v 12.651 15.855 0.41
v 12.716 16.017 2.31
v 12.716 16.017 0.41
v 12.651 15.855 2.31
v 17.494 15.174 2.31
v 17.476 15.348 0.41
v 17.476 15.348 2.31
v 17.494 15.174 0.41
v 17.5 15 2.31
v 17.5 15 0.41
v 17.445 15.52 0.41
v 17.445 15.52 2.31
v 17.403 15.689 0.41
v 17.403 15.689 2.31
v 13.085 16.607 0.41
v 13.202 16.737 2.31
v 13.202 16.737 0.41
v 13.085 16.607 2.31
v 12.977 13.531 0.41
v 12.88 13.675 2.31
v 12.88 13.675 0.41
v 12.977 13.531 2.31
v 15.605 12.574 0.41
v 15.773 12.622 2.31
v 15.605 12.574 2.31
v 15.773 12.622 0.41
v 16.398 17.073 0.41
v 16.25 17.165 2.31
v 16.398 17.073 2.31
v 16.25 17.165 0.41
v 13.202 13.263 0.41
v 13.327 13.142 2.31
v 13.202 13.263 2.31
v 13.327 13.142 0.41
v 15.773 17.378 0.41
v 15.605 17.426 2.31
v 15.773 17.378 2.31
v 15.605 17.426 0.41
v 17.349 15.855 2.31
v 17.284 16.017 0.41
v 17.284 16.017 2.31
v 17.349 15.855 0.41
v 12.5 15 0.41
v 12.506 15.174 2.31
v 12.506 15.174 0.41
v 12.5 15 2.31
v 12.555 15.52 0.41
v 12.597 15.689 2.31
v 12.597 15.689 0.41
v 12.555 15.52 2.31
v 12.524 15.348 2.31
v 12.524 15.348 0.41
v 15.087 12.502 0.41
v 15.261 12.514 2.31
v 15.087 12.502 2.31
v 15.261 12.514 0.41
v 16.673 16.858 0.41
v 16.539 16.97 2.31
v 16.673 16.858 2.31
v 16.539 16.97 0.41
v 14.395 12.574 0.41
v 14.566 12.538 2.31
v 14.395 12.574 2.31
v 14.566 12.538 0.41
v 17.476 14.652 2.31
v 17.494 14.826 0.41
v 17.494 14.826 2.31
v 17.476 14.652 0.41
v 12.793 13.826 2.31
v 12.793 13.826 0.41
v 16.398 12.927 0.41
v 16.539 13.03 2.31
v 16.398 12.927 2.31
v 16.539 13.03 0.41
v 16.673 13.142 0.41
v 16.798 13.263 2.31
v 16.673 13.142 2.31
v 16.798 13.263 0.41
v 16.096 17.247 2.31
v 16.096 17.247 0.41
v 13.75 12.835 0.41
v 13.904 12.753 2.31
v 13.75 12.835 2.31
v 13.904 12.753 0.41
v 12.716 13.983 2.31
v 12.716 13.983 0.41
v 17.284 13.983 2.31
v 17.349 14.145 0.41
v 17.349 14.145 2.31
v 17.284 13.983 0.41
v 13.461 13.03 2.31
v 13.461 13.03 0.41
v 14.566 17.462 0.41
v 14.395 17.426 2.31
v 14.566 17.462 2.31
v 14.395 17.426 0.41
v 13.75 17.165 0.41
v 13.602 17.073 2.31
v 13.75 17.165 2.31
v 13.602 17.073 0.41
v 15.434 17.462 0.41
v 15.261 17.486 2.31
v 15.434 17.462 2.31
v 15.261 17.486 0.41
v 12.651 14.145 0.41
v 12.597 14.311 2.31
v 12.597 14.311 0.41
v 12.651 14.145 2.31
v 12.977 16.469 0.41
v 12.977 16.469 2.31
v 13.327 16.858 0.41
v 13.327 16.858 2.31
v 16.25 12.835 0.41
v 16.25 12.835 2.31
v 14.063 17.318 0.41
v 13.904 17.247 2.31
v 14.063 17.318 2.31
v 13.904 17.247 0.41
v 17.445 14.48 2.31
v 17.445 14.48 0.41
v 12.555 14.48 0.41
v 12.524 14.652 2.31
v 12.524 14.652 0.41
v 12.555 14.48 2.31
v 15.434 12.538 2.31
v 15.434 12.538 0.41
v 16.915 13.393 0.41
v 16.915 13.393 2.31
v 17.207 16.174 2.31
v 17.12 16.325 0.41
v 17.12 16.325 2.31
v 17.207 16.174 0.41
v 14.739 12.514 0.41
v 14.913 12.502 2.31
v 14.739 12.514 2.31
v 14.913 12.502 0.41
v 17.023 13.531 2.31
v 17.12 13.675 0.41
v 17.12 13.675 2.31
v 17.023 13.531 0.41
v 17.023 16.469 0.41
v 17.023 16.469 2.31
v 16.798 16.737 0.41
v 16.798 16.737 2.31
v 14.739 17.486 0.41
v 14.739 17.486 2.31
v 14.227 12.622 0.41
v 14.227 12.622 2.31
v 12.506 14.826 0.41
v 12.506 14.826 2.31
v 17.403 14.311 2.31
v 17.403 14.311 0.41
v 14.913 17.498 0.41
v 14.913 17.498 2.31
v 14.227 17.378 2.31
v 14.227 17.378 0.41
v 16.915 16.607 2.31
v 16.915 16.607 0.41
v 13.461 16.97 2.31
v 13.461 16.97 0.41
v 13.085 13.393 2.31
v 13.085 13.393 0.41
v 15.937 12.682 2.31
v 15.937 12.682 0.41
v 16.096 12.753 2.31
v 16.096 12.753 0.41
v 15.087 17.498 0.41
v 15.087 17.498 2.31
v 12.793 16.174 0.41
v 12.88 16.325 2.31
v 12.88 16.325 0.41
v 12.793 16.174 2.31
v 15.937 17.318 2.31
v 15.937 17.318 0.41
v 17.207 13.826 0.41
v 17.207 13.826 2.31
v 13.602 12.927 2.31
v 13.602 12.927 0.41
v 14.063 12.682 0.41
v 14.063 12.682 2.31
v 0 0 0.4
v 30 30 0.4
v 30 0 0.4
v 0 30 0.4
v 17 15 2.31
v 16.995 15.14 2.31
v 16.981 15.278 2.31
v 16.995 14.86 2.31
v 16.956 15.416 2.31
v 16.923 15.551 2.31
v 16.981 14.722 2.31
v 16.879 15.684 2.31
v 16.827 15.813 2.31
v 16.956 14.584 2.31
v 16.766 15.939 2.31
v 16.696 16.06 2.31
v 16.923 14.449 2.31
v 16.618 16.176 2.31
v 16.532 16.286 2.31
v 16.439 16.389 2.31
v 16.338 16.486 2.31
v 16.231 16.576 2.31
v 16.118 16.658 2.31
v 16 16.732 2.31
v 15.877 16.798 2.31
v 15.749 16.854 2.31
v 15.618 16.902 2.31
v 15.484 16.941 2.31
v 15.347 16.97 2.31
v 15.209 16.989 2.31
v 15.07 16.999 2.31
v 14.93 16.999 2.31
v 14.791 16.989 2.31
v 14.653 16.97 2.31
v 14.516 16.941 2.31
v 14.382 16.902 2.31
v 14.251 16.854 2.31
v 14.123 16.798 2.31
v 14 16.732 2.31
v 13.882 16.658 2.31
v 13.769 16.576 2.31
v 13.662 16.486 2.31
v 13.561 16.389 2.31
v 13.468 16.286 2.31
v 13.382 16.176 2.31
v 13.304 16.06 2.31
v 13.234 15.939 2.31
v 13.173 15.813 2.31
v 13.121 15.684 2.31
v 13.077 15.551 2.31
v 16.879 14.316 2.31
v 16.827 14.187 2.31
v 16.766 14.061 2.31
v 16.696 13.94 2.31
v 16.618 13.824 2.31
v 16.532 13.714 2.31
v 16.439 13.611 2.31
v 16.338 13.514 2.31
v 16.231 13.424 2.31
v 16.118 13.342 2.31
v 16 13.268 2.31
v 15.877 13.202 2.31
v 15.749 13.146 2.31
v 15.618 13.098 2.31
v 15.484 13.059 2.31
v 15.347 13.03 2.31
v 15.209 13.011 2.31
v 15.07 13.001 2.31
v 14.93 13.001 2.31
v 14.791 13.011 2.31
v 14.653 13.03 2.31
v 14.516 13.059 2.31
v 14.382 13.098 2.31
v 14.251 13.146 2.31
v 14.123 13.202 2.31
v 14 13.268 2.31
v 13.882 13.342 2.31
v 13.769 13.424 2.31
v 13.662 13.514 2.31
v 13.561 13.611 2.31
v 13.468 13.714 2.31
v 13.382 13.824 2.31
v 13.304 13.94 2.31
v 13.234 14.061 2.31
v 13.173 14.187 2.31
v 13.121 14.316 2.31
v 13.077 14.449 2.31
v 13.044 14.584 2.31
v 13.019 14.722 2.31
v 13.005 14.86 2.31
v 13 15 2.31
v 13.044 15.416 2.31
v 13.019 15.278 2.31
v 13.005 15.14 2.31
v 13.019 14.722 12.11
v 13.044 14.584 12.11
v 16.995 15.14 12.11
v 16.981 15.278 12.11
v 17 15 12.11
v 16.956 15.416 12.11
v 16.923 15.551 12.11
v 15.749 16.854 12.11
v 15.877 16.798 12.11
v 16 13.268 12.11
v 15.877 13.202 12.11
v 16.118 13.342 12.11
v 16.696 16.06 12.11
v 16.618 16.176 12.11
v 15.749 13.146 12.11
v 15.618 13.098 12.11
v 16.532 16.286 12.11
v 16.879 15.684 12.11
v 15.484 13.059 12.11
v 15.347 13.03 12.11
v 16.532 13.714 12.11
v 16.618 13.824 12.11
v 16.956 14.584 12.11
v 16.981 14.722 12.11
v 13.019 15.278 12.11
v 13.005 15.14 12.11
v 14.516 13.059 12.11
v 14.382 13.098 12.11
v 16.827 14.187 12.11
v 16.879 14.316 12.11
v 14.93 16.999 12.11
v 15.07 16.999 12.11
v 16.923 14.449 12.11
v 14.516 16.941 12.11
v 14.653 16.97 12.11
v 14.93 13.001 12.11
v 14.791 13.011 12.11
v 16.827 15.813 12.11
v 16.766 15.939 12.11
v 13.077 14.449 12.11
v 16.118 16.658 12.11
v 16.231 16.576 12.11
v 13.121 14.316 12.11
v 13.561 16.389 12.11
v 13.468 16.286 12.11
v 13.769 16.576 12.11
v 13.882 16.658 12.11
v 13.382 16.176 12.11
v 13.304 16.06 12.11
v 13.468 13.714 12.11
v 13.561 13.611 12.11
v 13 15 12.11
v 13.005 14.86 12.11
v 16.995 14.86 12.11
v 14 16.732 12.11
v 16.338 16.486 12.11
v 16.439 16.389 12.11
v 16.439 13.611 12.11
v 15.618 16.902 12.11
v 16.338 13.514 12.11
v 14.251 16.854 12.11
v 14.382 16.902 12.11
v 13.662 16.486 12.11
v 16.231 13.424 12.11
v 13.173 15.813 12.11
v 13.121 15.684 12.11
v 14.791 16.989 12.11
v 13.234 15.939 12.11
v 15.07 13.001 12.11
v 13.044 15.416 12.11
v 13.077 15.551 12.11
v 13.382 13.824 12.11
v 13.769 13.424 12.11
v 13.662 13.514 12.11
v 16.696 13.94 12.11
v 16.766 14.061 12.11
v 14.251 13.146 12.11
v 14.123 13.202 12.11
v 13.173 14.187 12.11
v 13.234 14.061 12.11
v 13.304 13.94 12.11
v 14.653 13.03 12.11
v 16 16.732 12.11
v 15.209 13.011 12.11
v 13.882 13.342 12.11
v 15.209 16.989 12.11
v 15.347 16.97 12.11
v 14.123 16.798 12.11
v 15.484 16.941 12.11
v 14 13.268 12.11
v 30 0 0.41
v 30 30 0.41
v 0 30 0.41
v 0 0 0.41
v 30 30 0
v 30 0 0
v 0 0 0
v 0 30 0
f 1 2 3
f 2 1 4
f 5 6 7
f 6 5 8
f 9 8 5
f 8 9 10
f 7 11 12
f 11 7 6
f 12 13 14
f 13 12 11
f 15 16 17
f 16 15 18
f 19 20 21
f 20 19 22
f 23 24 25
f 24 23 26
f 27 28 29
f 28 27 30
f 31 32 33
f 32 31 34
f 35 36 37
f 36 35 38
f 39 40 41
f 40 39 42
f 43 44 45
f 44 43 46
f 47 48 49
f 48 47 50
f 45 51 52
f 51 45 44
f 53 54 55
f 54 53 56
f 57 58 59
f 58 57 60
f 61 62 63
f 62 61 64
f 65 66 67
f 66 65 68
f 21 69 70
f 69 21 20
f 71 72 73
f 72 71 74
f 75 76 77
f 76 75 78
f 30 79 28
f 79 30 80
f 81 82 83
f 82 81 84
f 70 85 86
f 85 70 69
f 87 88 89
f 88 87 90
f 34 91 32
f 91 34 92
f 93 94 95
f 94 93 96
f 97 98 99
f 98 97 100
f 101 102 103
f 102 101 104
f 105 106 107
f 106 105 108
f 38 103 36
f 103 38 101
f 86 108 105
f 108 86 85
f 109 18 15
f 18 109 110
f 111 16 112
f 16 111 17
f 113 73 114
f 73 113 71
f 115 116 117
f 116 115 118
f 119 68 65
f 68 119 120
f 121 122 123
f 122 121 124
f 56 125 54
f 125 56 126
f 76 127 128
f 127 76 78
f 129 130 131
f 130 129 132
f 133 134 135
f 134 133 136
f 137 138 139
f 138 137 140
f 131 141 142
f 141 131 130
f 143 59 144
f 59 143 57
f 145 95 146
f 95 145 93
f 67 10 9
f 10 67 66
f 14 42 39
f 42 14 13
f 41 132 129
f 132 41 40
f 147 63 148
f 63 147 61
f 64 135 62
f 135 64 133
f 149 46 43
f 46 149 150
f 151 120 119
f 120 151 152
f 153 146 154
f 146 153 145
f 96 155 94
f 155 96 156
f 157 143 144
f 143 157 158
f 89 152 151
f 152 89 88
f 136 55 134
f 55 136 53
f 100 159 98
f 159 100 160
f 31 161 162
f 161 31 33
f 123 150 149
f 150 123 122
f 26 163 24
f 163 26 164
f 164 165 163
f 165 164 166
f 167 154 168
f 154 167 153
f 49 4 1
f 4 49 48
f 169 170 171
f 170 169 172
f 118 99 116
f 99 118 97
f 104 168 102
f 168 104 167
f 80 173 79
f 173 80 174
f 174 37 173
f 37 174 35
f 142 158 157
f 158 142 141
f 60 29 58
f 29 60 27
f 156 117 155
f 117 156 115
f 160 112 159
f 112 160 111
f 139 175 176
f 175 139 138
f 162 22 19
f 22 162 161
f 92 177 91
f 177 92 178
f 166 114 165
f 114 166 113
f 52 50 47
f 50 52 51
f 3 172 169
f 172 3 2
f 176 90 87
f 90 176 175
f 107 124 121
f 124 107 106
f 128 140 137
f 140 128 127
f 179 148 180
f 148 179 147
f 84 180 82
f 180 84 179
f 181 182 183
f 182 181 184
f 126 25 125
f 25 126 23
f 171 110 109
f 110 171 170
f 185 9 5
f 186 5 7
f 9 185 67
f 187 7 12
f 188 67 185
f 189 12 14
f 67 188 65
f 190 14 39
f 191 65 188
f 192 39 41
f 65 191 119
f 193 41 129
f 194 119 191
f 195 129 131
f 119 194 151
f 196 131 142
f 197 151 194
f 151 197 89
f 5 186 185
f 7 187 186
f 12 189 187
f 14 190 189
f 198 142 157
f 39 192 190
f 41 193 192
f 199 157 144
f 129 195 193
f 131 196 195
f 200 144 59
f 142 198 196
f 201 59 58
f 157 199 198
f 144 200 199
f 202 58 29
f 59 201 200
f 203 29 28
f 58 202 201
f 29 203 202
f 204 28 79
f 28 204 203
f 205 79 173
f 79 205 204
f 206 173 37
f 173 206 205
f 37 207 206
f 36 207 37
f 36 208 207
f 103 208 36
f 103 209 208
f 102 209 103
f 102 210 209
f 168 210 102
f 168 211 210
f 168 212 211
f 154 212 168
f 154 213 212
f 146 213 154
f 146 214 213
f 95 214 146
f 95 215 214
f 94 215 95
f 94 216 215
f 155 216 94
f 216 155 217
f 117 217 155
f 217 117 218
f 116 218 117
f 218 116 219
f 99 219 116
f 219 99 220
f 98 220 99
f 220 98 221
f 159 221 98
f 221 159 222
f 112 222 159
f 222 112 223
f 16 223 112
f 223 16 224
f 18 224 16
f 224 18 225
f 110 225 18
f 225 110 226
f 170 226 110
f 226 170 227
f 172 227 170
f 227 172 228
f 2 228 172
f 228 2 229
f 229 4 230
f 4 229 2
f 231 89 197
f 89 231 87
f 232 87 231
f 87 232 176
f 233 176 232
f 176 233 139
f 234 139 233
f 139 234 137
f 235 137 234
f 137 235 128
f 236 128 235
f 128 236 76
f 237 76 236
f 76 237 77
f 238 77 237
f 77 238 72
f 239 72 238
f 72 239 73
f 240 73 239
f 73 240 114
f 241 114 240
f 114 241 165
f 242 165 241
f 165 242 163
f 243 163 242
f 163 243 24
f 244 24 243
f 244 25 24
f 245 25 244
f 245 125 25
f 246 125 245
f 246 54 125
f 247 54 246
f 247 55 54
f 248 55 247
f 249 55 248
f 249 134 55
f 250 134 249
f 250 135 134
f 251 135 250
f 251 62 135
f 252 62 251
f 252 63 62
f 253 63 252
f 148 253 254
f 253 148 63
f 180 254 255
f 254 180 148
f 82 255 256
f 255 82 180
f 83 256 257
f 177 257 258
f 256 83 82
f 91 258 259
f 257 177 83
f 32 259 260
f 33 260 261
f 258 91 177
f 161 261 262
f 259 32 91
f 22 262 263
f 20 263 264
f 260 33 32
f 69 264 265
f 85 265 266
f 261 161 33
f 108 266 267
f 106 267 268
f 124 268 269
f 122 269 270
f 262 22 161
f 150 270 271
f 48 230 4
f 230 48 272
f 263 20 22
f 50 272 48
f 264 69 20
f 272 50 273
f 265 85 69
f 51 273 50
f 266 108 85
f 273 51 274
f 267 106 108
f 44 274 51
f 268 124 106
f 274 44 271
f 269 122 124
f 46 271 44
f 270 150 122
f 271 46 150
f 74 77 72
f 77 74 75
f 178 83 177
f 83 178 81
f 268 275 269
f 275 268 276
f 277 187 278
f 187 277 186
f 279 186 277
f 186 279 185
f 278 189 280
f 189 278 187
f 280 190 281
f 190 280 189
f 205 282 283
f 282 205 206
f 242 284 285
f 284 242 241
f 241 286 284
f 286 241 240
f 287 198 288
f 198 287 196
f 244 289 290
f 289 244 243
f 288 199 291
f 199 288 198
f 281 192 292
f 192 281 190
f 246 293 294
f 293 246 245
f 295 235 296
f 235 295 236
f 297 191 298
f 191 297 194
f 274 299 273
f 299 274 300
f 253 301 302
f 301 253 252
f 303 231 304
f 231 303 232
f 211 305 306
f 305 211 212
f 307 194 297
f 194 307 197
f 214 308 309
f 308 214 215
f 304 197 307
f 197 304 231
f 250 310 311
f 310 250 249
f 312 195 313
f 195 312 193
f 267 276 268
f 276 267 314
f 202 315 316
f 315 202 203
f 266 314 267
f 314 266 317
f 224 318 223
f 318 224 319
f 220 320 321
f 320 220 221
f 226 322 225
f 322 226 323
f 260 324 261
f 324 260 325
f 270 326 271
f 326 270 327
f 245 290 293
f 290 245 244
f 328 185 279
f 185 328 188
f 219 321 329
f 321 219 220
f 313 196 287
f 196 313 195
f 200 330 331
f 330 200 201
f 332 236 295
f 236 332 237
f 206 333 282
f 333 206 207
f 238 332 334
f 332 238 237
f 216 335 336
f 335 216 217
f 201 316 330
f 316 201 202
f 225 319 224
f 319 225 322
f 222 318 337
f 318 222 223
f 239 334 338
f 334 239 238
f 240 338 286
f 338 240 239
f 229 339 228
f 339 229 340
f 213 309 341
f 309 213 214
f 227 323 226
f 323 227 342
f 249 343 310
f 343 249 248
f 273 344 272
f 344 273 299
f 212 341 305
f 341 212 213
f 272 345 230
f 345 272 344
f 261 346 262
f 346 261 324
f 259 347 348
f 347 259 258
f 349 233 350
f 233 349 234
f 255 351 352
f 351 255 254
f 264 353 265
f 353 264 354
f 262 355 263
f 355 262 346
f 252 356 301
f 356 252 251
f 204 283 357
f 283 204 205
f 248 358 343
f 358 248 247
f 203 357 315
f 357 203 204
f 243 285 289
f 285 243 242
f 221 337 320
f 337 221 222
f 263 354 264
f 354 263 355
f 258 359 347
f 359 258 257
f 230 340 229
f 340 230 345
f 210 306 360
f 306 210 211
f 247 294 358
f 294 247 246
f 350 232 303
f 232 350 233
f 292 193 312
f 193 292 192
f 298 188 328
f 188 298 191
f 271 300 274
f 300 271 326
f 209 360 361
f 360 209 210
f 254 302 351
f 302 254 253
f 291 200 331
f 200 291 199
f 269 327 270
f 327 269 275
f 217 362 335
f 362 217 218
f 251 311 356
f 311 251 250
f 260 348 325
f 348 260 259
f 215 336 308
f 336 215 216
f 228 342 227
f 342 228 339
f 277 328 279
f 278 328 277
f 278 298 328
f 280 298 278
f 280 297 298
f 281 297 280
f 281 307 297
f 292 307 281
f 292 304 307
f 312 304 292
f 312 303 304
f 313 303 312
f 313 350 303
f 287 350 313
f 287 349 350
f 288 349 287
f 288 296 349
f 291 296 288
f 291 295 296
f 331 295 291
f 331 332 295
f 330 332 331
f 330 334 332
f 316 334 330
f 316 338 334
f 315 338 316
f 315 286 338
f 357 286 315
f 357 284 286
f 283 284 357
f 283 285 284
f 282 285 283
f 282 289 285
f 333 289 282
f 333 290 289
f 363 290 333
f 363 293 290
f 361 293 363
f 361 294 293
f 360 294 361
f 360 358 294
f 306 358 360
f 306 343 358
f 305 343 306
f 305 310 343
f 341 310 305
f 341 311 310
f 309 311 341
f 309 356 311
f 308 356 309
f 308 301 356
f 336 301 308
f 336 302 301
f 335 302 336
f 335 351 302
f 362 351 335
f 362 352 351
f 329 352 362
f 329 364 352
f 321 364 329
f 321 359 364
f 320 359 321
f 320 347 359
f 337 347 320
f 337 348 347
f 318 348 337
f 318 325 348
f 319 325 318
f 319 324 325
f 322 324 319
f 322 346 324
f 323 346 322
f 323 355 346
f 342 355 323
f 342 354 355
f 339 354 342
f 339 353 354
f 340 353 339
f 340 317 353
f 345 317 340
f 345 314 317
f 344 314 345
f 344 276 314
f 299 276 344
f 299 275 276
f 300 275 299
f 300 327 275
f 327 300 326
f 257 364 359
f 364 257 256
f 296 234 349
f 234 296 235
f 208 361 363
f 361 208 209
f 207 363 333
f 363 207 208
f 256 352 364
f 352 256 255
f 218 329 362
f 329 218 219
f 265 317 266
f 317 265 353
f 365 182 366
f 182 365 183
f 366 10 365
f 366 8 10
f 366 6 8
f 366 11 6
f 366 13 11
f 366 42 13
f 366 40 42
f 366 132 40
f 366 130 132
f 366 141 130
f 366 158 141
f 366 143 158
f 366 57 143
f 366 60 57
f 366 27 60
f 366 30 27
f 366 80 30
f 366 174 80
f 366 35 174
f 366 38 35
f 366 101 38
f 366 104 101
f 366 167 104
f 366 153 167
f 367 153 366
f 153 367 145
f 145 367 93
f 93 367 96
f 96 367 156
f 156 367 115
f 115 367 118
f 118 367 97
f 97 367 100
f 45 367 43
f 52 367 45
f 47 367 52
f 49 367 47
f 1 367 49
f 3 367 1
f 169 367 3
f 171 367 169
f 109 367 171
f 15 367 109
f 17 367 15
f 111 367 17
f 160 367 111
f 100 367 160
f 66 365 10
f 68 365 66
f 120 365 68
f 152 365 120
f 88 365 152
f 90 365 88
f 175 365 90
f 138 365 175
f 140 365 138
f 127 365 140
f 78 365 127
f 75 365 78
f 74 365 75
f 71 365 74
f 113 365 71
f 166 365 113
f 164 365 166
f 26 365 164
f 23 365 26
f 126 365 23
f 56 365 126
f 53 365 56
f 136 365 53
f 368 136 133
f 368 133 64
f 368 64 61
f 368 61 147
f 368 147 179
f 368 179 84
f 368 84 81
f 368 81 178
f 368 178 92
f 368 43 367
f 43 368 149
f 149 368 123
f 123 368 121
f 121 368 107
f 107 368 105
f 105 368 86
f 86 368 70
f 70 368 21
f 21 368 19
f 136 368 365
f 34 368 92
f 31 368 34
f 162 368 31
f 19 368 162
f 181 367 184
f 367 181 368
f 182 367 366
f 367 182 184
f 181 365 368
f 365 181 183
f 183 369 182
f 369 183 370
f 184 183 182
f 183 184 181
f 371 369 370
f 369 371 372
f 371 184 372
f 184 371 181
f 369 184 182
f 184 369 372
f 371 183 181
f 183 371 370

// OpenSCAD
// file: ../../Base/Boxes.scad
// Fischertechnik Box Foundation
// Pre-designed Boxes

use <Constants.scad>

include <PlacementOptions.scad>

box190Width = 190;
box190Depth = 130;
box130Width = 130;
box130Depth = 95;
boxUsageHeight = 33.9;
boxWallThickness = 2.4;
boxBaseThickness = 1.0;
boxWebWidth = 3.0;

// getBoxWallThickness()
// Gets the wall thickness of a Fischertechnik Box

function getBoxWallThickness() = boxWallThickness;

// Gets the usable height of a fischertechnik box
function getBoxUsageHeight() = boxUsageHeight;

// Gets the thickness of the Fischertechnik box base.
function getBoxBaseThickness() = boxBaseThickness;

// Gets the width of a box web
function getBoxWebWidth() = boxWebWidth;

// Gets the usable inner space of a Box 190 as an x/y-list
function getBox190Space() = [
    box190Width - 2*getBoxWallThickness(), 
    box190Depth - 2*getBoxWallThickness() ];

// Imports the Fischertechnik empty box 130x190 mm and places it at position 0,0
// 190x130 are the outer sizes, the inner space is slightly smaller. Use getBox190Space() to get the inner sizes.
// This module needs the STL file "Fischertechnik Box 130x190.stl" in the library path.
// The box is positioned that the usable inner space is at the 0,0,0 position. The

module Box190() {
    translate([-getBoxWallThickness(),-getBoxWallThickness(),-getBoxBaseThickness()])
        import("Fischertechnik Box 130x190.stl", convexity=3);
}

// Gets the usable inner space of a Box 130 as an x/y-list
function getBox130Space() = [
    box130Width - 2*getBoxWallThickness(), 
    box130Depth - 2*getBoxWallThickness() ];

// Imports the Fischertechnik empty box 95x130 mm and places it at position 0,0
// 190x130 are the outer sizes, the inner space is slightly smaller. Use getBox190Space() to get the inner sizes.
// This module needs the STL file "Fischertechnik Box 95x130.stl" in the library path.
// The box is positioned that the usable inner space is at the 0,0,0 position. The

module Box130() {
    translate([-getBoxWallThickness(),-getBoxWallThickness(),-getBoxBaseThickness()])
        import("Fischertechnik Box 95x130.stl", convexity=3);
}

// Creates a web at the specified box walls
// corner 0 = LowerLeft, 1 = UpperLeft, 2 = UpperRight, 3 = LowerRight
// side 0 = LeftOfCorner, 1 = RightOfCorner
// distance = Distance in mm from the corner
// box = inner width and depth of the box (default: Box 190)
// webWidth = length of the web (default is 3 mms)
// webThickness = thickness of the web (default is 1 mm)

module BoxWeb(corner, side, distance, box=getBox190Space(), webWidth=getBoxWebWidth(), webThickness=1.0) {
    sink = getBoxWallThickness()/2;

    width = (corner % 2 == 0) ? 
            (side == LeftOfCorner ? webWidth : webThickness) :
            (side == LeftOfCorner ? webThickness : webWidth);

    depth = (corner % 2 == 0) ? 
            (side == RightOfCorner ? webWidth : webThickness) :
            (side == RightOfCorner ? webThickness : webWidth);
    
    xDiff = corner == LowerLeft ? 
                (side == LeftOfCorner ? -sink : distance) :
            (corner == UpperLeft ?                
                (side == LeftOfCorner ? distance : -sink) :
            (corner == UpperRight ?
                (side == LeftOfCorner ? box.x-webWidth+sink : box.x-distance-webThickness) :
                (side == LeftOfCorner ? box.x-distance-webThickness: box.x-webWidth+sink)));

    yDiff = corner == LowerLeft ? 
                (side == RightOfCorner ? -sink : distance) :
            (corner == UpperLeft ?
                (side == RightOfCorner ? box.y-distance : box.y-webWidth+sink) :
            (corner == UpperRight ?
                (side == RightOfCorner ? box.y-webWidth+sink : box.y-distance) :
                (side == RightOfCorner ? distance : -sink)));
    
    translate([xDiff, yDiff, -getExcess()])
        cube([width, depth, boxUsageHeight + 2*getExcess()]);
}
// file: ../../Base/Rotation.scad
// Fischertechnik Box Foundation
// Geometry Helpers Rotation

include <PlacementOptions.scad>

// getRotatedSpace(space, rotation=NoRotation)
// Rotates the space dependent on the specified rotation

function getRotatedSpace(space, rotation=NoRotation) = [
    (rotation == Rotate90 || rotation == Rotate270) ? space.y : space.x,
    (rotation == Rotate90 || rotation == Rotate270) ? space.x : space.y
];

// Rotates the given space around the fixed left lower corner
// space = the space the children needs as width/depth list [width,depth]
// rotation = 0 Rotate0 degrees, 1 Rotate90 degrees, 2 Rotate180 degrees, 3 Rotate270 degrees (equivalent to -90)

module RotateFix(space, rotation=Rotate0) {
    dy = (rotation == Rotate0 || rotation == Rotate270) ? 0 :
        (rotation == Rotate90) ? space.x :
        space.y;
    dx = (rotation < Rotate180) ? 0 :
        (rotation == Rotate180) ? space.x :
        space.y;
    
    translate([dx, dy, 0])
        rotate([0, 0, rotations[rotation]])
            children();
}
// file: ../../Base/Alignment.scad
// Fischertechnik Box Foundation
// Geometry Helpers Alignment

include <PlacementOptions.scad>

// getAlignedX(elementWidth, spaceWidth, align=AlignRight, offset=0)
// Gets the aligned X offset of an element with the given
// width in the given space.
// elementWidth = The width of the element to positon
// spaceWidth = The space where the element should be aligned
// align = 0 AlignLeft, 1 AlignCenter, 2 AlignRight
// offset = an optional offset from the aligned position. When
// aligned left or centered, then positive values are in X direction.
// When aligned right then positive values are in negative X direction.

function getAlignedX(elementWidth, spaceWidth, align=AlignRight, offset=0) =
    (align == AlignLeft) ?
        offset :
        ((align == AlignCenter) ?
        (spaceWidth - elementWidth)/2 + offset :
        spaceWidth - offset - elementWidth);

// getAlignedY(elementDepth, spaceDepth, align=AlignTop, offset=0)
// Gets the aligned Y offset of an element with the given
// depth in the given space.
// elementDepth = The depth of the element to positon
// spaceDepth = The space where the element should be aligned
// align = 0 AlignBottom, 1 AlignCenter, 2 AlignTop
// offset = an optional offset from the aligned position. When
// aligned bottom or centered, then positive values are in Y direction.
// When aligned top then positive values are in negative Y direction.

function getAlignedY(elementDepth, spaceDepth, align=AlignTop, offset=0) =
    (align == AlignBottom) ?
        offset :
        ((align == AlignCenter) ?
        (spaceDepth - elementDepth)/2 + offset :
        spaceDepth - offset - elementDepth);
// file: ../../Base/PlacementOptions.scad
// Fischertechnik Box Foundation
// Placement Options

// Alignment
NoAlign = 0;
AlignLeft = 1;
AlignBottom = 2;
AlignCenter = 3;
AlignRight = 4;
AlignTop = 5;

// Element rotation degree steps
rotations = [0, -90, -180, -270];

// Rotation
NoRotation = 0;
Rotate0 = 0;
Rotate90 = 1;
Rotate180 = 2;
Rotate270 = 3;

// Docking (seen from above)
NoDock = -1;
DockLeft = 0;
DockTop = 1;
DockRight = 2;
DockCorner = 2;
DockBottom = 3;

// Web corners
LowerLeft = 0;
UpperLeft = 1;
UpperRight = 2;
LowerRight = 3;

// Web position relative to corner
LeftOfCorner = 0;
RightOfCorner = 1;
// file: ../../Base/Placement.scad
// Fischertechnik Box Foundation
// Geometry Helpers Placement

use <Constants.scad>
use <Alignment.scad>
use <Rotation.scad>
use <Boxes.scad>

include <PlacementOptions.scad>

// Place(x=0, y=0, elementSpace=[0,0], alignX=AlignLeft, alignY=AlignBottom, rotation=Rotate0, boxSpace=getBox190Space())
// Places the child at the specified position
// y = Y-Position. This is a relative position when an X aligment is specified.
// x = X-Position. This is a relative position when an Y aligment is specified.
// elementSpace = space of the element to be placed [x,y]
// alignX = -1=NoAlign, 0 AlignLeft, 1 AlignCenter, 3 AlignRight (elementSpace and boxSpace required!)
// alignY = -1=NoAlign, 2 AlignBottom, 1 AlignCenter, 4 AlignTop (elementSpace and boxSpace required!)
// rotation = 0 Rotate0 0 degrees, 1 Rotate90 90 degrees, 
// 2 Rotate180 180 degrees, 3 Rotate270 270 degrees (equivalent to -90)
// boxSpace = Inner space of the box where the placement occurs [x,y] - default is Box 190x130 inner space

module Place(x=0, y=0, elementSpace=[0,0], 
  alignX=AlignLeft, alignY=AlignBottom, 
  rotation=NoRotation, boxSpace=getBox190Space()) {

    module Position(x, y, space, rotation=Rotate0) {
        translate([x, y, 0])
            RotateFix(space, rotation)
                children();
    }

    space = getRotatedSpace(elementSpace, rotation);
    alignedX = getAlignedX(space.x, boxSpace.x, alignX, x);
    alignedY = getAlignedY(space.y, boxSpace.y, alignY, y);
    Position(alignedX, alignedY, elementSpace, rotation)
        children();
}

// Center(space=getBox130Space(), elementSpace=[0,0])
// space = Space where the children is centered. For cylinder use centered=true and no elementSpace.
// elementSpace = space of the element to be centered [x,y]

module Center(space=getBox190Space(), elementSpace=[0,0]) {
    translate([(space.x - elementSpace.x) / 2, (space.y - elementSpace.y) / 2])
        children(0);
}

// CenterHorizontal(width=0, y=0, offset=0, space=getBox130Space())
// space = Space where the children is centered. For cylinder use centered=true and no elementSpace.
// elementSpace = space of the element to be centered [x,y]

module CenterHorizontal(width=0, y=0, offset=0, space=getBox190Space()) {
    translate([(space.x - width) / 2 + offset, y])
        children(0);
}

// CenterVertical(depth=0, x=0, offset=0, space=getBox130Space())
// space = Space where the children is centered. For cylinder use centered=true and no elementSpace.
// elementSpace = space of the element to be centered [x,y]

module CenterVertical(depth=0, x=0, offset=0, space=getBox190Space()) {
    translate([x, (space.y - depth) / 2 + offset])
        children(0);
}
// file: ../../Elements/AxisClip10.scad
// Fischertechnik Box Library
// Axis for clip 10
// 31023

use <../ModelBase/Simple.scad>

width = 12;
depth = 12;
height = 23;

// getAxisClip10Space()
// Gets the space of a frame for a clip 10 with spring ring (mot2)

function getAxisClip10Space() = [width, depth, height];

// AxisClip10()
// Axis for clip 10 with spring ring (mot2)

module AxisClip10() {
    LeveledAxisWithSpace(height, height-10, getAxisClip10Space());
}

// Tests
color("lightgray")
AxisClip10();
// file: ../../Base/Constants.scad
// Fischertechnik Box Foundation
// Constants

// Constant values necessary for multiple elements

// Base constants
dividerThickness = 1.2;
excess = 0.01;
fragments = 90;
tolerance = 0.8;

// Gets the thickness of a divider 
function getDividerThickness() = dividerThickness;

// Gets the excess that is used to merge walls into each other
function getExcess() = excess;

// Gets amount of fragments of a cylinder
function getFragments() = fragments;

// Gets the inner tolerance of a frame to each side
function getTolerance() = tolerance;


// Fischertechnik specific constants
axisDiameter = 4;
axisBottomDiameter = axisDiameter + 1;
standardEdgeDistance = 2.5;
standardWebDistance = 11.5;
standardCornerLength = 15;
tubeWallFactor = 0.8;

// Gets axis diameter
function getAxisDiameter() = axisDiameter;

// Gets axis bottom diameter for thicker part at the bottom
function getAxisBottomDiameter() = axisBottomDiameter;

// gets the standard distance to the wall of the box for dockable frames with webs
function getStandardEdgeDistance() = standardEdgeDistance;

// gets the standard distance of each web to the corner of the dockable frame
function getStandardWebDistance() = standardWebDistance;

// gets the standard length of the corner walls of a dockable frame
function getStandardCornerLength() = standardCornerLength;

// gets the wall thickness of a tube.
function getTubeWallThickness() = tubeWallFactor * getDividerThickness();
// file: ../../Elements/AxisFlatHub.scad
// Fischertechnik Box Library
// Axis for flat hub
// 31015

use <../Base/Constants.scad>
use <../ModelBase/Simple.scad>

width = 30;
depth = 30;

// getAxisFlatHubSpace()
// Gets the space the axis flat hub needs as width and depth (.x and .y as a list)

function getAxisFlatHubSpace() = [width, depth];

// AxisFlatHub()
// Standing axis for flat hub.

module AxisFlatHub() {
    height = 11.7;
    levelHeight = 1.9;
    LeveledAxisWithSpace(height, levelHeight, getAxisFlatHubSpace());
}

// Tests
color("lightgray")
AxisFlatHub();
// file: ../TestPrint.scad
// 3D Print Test Base

use <../Base/Constants.scad>

use <../Elements/AxisClip10.scad>

module TestPrint(elementSpace) {
    cube([elementSpace.x, elementSpace.y, 0.4]);
    translate([0,0,0.4+getExcess()]) {
        children();
    }
}

TestPrint(getAxisClip10Space())
    AxisClip10();
// main file
// 3D Print Test
// AxisFlatHub

use <../TestPrint.scad>
use <../../Elements/AxisFlatHub.scad>

TestPrint(getAxisFlatHubSpace())
    AxisFlatHub();
